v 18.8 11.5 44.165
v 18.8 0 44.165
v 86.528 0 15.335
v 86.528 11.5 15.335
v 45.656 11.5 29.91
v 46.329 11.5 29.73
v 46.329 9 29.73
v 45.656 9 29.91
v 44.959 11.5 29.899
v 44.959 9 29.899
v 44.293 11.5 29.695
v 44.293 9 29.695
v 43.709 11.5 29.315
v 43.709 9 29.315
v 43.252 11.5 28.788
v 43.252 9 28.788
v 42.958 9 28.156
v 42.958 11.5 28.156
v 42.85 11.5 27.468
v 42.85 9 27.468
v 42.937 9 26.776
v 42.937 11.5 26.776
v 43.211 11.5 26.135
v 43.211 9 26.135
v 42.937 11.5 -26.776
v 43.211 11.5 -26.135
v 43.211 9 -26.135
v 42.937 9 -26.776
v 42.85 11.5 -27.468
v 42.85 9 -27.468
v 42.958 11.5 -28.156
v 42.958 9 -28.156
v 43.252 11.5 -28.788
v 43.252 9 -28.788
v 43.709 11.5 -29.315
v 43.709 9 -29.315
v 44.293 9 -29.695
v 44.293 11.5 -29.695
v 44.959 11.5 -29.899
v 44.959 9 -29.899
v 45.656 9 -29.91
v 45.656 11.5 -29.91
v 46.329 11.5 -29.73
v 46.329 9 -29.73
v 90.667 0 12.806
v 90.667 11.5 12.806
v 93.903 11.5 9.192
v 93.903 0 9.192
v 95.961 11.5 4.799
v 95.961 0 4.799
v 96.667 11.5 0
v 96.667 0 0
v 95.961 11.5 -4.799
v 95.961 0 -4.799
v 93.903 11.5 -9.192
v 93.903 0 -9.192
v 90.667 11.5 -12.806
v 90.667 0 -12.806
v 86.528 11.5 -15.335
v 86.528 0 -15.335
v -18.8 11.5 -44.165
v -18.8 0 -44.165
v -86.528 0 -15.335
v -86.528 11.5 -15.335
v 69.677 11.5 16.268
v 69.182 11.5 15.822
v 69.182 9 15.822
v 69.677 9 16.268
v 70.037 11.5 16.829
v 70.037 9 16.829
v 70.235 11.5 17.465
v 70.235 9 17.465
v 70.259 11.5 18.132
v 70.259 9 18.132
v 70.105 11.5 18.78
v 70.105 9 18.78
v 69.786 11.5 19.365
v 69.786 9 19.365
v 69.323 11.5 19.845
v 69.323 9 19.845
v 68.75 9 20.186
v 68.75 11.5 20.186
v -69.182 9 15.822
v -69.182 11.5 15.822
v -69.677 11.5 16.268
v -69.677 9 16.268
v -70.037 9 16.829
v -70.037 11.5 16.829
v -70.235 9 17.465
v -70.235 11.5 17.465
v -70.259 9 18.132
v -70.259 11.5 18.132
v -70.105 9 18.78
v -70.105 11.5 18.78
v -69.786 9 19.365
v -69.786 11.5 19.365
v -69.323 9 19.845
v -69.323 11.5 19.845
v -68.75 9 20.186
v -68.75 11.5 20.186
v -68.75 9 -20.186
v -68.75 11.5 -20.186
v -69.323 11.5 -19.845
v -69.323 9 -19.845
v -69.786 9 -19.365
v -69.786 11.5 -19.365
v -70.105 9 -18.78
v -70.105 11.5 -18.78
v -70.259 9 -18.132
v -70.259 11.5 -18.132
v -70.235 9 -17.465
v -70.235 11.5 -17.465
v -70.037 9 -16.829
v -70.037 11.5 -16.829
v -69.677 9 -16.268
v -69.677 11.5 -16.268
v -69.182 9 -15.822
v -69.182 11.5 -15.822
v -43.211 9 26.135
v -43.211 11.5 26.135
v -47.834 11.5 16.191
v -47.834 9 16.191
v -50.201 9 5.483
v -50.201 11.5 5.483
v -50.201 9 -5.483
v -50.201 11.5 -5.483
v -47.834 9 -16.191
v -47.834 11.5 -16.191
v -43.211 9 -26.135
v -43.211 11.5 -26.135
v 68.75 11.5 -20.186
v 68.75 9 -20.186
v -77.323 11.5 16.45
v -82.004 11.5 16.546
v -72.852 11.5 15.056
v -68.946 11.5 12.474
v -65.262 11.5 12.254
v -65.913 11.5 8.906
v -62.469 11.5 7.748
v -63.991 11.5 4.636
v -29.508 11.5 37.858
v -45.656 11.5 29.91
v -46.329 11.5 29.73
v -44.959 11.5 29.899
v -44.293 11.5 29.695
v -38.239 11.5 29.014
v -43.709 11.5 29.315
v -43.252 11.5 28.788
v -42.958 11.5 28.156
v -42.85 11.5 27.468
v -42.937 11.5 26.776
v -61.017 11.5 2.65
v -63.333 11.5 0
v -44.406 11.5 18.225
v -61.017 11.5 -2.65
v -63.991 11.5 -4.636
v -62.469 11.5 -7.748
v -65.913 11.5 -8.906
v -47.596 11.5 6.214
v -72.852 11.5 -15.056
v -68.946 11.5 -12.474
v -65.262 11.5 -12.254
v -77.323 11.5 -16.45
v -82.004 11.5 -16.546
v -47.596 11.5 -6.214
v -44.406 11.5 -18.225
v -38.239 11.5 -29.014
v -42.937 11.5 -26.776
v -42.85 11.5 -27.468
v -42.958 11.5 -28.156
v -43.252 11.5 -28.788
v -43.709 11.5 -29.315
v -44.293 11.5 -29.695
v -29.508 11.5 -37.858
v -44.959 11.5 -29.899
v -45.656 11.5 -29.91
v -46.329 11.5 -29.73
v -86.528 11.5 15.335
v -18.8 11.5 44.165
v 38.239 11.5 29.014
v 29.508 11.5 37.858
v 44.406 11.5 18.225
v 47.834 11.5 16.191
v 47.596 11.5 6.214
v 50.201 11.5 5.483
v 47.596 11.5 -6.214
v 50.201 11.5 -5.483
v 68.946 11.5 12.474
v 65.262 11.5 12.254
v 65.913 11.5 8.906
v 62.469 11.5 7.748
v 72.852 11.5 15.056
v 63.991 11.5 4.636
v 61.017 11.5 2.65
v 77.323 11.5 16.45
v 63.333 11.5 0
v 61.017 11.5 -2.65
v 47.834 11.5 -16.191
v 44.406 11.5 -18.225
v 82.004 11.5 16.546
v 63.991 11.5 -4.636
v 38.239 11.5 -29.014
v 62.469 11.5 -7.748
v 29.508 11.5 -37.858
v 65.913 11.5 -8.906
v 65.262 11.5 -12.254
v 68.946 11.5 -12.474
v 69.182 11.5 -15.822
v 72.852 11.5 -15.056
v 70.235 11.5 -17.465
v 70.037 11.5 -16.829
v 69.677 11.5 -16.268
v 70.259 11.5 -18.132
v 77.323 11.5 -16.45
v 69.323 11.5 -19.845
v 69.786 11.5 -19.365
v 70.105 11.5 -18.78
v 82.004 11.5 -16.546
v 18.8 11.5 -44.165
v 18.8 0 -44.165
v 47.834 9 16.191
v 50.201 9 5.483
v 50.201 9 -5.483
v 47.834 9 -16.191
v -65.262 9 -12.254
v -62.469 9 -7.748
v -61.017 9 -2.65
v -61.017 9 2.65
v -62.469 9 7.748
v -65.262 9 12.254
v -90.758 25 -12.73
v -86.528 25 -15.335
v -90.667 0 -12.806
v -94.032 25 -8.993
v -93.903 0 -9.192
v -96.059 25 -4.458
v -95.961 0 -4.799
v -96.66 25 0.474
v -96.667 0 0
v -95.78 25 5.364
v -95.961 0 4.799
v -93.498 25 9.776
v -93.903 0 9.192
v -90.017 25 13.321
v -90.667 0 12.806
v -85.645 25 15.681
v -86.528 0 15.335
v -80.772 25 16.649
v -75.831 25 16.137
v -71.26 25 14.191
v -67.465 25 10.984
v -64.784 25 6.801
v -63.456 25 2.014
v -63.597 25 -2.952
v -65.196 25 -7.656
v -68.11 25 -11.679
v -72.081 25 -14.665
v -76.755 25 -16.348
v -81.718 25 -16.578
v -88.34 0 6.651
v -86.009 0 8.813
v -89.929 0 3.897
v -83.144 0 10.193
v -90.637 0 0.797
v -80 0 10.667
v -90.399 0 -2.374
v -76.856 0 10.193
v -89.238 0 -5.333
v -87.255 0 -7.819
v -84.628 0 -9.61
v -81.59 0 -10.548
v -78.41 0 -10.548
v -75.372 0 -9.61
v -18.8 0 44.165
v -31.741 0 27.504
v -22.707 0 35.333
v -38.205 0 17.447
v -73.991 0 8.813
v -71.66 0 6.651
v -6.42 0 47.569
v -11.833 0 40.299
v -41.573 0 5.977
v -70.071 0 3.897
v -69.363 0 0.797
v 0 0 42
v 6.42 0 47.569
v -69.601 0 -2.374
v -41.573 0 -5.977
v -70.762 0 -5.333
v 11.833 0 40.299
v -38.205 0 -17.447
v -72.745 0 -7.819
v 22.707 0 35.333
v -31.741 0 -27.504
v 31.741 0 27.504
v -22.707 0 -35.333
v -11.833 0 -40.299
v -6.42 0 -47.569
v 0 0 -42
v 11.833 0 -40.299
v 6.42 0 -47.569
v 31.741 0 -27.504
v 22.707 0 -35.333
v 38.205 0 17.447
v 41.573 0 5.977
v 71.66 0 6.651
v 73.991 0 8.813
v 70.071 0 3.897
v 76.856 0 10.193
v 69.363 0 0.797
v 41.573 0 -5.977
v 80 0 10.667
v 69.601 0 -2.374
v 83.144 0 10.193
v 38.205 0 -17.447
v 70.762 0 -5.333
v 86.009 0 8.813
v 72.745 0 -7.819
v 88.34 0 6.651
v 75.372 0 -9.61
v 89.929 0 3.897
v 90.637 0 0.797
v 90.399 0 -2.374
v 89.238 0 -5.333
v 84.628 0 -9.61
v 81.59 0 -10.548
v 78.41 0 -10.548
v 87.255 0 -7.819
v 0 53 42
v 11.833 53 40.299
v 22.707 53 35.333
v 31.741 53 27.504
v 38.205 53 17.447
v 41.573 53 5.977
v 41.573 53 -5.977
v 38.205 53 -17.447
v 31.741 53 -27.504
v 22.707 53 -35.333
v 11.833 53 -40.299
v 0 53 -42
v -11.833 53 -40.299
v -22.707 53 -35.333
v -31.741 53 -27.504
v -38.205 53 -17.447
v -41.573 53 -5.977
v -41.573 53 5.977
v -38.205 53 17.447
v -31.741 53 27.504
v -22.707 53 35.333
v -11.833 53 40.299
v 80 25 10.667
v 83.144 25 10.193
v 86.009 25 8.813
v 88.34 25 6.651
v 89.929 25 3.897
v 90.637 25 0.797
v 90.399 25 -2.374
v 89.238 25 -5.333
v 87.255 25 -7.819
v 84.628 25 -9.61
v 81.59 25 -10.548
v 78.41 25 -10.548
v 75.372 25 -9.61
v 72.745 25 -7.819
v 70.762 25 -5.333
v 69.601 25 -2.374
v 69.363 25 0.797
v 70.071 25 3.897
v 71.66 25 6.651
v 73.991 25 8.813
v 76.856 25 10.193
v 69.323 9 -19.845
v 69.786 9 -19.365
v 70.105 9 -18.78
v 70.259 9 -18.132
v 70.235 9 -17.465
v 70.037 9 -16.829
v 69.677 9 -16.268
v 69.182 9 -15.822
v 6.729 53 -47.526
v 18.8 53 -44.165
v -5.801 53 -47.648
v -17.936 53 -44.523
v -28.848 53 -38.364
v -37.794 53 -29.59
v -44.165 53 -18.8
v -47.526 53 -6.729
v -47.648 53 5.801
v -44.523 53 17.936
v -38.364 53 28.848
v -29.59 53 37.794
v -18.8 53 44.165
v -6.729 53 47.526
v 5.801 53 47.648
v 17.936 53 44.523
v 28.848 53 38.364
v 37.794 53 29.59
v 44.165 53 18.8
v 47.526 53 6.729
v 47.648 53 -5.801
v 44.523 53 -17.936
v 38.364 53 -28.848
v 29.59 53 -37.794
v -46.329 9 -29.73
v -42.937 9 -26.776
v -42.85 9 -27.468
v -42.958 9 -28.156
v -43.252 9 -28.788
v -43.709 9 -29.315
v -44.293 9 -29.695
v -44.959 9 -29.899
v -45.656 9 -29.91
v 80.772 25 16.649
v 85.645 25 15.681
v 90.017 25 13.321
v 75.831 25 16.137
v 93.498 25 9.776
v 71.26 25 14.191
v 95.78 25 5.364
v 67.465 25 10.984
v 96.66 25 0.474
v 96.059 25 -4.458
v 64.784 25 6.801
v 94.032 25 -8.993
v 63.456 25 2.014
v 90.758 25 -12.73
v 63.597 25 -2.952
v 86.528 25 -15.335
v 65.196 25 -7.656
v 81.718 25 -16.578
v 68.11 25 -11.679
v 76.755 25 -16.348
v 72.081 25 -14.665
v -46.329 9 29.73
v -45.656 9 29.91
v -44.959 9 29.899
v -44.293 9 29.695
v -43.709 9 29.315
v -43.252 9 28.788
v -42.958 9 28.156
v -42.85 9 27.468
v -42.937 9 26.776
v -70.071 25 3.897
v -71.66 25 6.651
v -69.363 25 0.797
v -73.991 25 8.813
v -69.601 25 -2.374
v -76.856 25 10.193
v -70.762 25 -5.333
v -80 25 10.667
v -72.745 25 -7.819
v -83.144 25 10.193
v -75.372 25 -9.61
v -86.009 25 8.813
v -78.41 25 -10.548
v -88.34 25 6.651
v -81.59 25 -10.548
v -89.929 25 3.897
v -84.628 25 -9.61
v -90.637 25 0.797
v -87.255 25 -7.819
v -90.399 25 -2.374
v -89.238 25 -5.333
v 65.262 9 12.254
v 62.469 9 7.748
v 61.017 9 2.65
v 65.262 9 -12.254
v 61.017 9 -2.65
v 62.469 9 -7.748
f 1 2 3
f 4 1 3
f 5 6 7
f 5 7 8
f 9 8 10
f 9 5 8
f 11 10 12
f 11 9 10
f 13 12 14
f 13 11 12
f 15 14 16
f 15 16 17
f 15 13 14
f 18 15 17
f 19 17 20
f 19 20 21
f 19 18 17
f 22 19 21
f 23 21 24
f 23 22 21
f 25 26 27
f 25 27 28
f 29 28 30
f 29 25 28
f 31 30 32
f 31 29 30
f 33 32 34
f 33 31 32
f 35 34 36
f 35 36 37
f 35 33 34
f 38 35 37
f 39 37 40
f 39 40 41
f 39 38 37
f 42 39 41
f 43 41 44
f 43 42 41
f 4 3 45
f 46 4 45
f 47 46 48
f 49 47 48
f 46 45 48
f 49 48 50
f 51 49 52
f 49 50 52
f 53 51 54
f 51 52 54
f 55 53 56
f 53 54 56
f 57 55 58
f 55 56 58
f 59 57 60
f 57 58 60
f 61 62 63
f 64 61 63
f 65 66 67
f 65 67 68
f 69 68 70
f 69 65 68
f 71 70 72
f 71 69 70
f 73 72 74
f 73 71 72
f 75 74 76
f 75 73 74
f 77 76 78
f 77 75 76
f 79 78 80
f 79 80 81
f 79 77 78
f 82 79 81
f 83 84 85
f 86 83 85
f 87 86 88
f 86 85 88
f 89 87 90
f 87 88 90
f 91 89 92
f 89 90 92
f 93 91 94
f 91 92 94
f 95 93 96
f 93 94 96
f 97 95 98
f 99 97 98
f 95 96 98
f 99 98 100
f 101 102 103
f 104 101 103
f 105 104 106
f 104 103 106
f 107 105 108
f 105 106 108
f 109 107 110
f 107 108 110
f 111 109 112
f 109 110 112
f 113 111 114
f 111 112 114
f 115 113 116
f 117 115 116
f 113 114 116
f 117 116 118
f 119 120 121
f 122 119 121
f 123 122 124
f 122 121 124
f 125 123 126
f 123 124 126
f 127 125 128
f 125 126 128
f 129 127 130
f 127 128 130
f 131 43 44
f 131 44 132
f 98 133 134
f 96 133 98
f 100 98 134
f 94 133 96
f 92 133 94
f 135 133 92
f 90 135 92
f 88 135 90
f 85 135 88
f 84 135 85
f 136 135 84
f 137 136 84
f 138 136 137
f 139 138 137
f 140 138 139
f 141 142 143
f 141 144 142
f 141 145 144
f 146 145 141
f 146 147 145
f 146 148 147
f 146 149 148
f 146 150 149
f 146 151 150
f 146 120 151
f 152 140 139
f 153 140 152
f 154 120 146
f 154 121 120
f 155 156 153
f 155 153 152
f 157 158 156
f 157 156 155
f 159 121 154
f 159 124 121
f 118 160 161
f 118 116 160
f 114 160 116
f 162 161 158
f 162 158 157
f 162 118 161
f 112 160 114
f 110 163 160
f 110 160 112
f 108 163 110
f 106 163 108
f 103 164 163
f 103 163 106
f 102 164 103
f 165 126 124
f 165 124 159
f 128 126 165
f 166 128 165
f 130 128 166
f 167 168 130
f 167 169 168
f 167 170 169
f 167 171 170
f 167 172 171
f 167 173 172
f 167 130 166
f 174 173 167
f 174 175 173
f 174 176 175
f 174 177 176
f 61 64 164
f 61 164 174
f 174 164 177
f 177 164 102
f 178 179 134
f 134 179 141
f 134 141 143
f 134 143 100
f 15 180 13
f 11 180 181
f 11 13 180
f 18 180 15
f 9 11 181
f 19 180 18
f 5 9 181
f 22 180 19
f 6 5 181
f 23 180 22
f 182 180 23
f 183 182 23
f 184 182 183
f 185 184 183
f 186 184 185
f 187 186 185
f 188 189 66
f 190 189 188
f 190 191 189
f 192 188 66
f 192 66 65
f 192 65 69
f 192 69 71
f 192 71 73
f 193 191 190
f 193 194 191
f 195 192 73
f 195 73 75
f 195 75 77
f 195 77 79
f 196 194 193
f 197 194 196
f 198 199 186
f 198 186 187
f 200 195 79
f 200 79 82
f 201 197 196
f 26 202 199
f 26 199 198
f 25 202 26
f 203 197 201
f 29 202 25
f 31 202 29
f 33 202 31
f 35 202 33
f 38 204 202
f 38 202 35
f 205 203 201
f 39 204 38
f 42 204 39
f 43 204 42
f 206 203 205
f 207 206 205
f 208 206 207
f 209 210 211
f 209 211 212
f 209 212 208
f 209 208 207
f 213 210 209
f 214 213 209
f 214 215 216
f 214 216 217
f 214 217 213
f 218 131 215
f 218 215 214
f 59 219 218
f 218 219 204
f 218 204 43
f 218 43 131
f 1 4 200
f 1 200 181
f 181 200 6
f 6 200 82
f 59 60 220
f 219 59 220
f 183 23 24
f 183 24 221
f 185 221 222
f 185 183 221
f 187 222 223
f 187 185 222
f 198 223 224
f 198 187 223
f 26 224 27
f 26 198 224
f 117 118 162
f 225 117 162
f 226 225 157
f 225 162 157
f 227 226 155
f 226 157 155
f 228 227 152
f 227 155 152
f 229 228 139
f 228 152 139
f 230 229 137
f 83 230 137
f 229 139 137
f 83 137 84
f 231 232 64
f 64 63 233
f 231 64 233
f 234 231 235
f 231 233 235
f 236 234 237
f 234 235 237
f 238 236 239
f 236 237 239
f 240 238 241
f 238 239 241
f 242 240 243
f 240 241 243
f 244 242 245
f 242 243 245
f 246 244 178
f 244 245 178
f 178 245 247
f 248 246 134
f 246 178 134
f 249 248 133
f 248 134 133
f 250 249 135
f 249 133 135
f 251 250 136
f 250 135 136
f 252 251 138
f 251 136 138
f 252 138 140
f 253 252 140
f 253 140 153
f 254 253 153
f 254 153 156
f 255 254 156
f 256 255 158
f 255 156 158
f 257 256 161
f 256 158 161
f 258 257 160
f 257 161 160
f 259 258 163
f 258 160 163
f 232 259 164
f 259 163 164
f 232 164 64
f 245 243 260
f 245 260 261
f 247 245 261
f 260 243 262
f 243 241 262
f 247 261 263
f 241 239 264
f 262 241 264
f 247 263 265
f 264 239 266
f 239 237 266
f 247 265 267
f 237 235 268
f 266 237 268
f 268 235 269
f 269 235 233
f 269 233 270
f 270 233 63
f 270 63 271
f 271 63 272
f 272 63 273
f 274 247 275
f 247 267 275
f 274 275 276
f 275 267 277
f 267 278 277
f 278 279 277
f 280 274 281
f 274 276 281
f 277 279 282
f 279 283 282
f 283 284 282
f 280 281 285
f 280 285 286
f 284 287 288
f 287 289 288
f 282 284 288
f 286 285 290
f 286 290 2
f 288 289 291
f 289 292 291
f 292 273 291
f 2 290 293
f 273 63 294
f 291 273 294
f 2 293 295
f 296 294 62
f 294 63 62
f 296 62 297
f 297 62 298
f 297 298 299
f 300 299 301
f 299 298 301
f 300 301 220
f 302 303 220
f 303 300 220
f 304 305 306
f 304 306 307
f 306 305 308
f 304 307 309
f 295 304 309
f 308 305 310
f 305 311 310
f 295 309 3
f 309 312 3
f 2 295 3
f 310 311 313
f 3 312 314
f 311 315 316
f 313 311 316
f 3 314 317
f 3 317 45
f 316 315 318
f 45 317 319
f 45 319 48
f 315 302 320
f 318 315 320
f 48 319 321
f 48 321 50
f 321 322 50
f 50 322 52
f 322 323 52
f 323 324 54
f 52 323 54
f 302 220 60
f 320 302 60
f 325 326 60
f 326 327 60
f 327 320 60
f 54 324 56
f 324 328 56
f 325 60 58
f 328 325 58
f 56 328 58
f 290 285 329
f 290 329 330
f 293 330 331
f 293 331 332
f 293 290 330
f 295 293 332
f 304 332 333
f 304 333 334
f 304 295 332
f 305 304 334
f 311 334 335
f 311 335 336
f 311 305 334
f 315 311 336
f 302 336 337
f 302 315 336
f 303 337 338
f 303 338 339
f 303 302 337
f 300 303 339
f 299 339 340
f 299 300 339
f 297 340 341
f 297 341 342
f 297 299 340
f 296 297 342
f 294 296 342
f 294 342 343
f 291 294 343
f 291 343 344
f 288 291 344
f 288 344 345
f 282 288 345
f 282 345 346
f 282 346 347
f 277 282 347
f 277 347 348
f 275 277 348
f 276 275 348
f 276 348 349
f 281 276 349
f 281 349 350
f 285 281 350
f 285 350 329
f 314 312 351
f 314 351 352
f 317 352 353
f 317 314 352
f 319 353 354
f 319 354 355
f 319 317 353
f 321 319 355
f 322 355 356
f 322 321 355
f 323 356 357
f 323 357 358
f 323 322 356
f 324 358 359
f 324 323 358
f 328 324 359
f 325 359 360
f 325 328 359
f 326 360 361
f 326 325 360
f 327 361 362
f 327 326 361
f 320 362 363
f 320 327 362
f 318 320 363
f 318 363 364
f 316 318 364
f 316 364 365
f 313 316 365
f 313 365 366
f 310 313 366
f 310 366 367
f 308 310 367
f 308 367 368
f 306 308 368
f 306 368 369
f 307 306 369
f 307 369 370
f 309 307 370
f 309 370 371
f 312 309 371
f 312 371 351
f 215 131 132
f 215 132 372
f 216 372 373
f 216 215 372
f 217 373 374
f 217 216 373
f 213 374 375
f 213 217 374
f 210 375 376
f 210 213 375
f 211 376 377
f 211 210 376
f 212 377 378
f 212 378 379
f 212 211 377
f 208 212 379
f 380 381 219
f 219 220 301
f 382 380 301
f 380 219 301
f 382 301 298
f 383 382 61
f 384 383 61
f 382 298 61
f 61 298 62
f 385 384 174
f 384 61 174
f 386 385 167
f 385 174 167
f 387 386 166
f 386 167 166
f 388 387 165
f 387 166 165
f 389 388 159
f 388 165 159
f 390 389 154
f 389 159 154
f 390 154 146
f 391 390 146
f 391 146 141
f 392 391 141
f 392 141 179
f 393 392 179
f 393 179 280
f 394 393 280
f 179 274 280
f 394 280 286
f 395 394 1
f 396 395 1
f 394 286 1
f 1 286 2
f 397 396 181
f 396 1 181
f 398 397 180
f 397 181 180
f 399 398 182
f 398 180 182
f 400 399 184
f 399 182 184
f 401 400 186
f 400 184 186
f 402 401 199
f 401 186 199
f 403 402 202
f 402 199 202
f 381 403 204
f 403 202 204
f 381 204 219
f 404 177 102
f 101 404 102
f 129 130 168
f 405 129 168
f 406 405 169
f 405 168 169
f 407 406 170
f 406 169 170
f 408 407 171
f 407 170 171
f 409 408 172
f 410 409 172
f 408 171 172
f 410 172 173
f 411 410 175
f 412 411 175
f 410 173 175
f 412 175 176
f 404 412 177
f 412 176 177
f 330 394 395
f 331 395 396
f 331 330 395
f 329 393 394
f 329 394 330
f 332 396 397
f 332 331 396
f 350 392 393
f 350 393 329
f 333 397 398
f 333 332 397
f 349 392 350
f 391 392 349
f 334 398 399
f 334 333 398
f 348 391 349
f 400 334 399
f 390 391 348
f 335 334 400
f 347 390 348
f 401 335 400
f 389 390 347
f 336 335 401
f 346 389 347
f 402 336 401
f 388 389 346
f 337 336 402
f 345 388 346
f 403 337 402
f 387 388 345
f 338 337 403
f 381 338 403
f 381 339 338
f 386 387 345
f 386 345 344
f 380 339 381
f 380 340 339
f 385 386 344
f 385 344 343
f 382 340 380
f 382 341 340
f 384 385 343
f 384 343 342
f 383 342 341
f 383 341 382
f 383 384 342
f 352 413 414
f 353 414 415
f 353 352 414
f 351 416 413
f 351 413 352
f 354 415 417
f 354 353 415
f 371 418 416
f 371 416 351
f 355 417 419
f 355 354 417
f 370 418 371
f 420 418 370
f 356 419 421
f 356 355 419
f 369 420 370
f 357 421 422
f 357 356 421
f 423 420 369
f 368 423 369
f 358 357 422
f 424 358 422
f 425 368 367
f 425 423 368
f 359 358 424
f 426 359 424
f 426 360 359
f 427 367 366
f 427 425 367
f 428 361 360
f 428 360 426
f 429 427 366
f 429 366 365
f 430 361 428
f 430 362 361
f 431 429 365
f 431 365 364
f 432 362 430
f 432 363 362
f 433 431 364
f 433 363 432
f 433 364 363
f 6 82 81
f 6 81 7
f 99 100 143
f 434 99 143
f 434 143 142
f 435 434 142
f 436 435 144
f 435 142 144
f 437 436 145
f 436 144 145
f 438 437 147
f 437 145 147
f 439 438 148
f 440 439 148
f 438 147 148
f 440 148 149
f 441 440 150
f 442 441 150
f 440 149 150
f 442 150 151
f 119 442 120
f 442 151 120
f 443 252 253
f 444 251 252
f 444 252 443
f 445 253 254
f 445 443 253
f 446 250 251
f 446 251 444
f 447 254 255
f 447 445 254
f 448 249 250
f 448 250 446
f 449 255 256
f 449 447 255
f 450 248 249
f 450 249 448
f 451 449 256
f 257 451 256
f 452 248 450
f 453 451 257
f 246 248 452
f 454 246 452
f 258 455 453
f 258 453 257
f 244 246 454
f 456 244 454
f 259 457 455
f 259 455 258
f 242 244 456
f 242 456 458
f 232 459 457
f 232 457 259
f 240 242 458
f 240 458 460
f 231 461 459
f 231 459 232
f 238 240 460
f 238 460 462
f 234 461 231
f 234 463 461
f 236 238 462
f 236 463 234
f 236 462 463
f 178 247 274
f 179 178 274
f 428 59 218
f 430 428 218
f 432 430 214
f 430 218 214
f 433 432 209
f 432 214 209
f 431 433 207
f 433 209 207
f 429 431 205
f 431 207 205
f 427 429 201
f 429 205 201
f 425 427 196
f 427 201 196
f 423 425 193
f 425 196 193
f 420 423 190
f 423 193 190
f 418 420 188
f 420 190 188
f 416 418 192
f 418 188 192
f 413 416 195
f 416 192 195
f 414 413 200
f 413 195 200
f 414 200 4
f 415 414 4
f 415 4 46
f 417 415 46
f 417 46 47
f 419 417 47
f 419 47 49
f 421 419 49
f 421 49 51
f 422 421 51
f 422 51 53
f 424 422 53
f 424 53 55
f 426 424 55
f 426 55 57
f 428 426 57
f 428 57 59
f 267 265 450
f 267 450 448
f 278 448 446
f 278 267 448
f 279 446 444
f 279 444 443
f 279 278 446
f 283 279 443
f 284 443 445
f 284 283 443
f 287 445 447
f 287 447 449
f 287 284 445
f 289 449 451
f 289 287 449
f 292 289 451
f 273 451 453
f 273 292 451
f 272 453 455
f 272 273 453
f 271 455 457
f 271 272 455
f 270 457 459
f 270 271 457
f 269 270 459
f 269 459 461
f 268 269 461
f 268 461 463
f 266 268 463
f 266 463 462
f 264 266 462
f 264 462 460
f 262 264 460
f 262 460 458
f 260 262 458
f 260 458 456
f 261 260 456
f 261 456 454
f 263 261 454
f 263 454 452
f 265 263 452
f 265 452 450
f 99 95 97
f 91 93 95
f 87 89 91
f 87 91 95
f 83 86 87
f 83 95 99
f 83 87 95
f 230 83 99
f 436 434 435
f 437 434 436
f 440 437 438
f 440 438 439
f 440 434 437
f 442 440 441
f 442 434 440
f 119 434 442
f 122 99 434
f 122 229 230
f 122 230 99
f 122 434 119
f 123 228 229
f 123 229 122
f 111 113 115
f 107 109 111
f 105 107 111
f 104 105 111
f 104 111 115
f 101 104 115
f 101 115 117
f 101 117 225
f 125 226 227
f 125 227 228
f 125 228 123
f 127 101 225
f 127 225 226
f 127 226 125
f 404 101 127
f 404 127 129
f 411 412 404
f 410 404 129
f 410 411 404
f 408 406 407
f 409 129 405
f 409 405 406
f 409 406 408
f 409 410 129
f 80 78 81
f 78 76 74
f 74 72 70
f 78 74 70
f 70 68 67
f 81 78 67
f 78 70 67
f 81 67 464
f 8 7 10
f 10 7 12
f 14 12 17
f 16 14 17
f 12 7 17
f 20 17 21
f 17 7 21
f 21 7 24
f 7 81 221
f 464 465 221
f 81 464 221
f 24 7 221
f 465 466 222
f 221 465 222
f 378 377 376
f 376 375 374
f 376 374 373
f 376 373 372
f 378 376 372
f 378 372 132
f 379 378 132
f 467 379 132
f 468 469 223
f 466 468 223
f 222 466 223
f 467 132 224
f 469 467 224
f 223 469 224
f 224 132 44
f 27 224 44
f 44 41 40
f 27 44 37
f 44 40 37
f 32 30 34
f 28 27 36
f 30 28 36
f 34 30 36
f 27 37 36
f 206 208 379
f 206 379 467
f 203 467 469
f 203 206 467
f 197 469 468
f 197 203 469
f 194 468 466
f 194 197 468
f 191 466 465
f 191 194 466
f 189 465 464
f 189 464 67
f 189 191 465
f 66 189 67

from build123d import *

# Parameters (mm, degrees)
SKETCH1_R           = 42
SKETCH1_R_2         = 10.666666667
BOSS_EXTRUDE1_DEPTH = 11.5
SKETCH1_3_R         = 16.666666667
SKETCH1_3_R_2       = 10.666666667
BOSS_EXTRUDE2_DEPTH = 25
SKETCH1_4_R         = 42
BOSS_EXTRUDE3_DEPTH = 53
CUT_EXTRUDE1_DEPTH  = 2.5


with BuildPart() as part:
    # Sketch1 → Boss-Extrude1 (new body)
    with BuildSketch(Plane(origin=(0, 0, 0), x_dir=(1, 0, 0), z_dir=(0, 1, 0))):
        with BuildLine():
            Line((-18.8, 44.165144628), (-86.527777778, 15.335119662))
            ThreePointArc((-86.527777778, 15.335119662), (-96.666666667, 0), (-86.527777778, -15.335119662))
            Line((-86.527777778, -15.335119662), (-18.8, -44.165144628))
            ThreePointArc((-18.8, -44.165144628), (0, -48), (18.8, -44.165144628))
            Line((18.8, -44.165144628), (86.527777778, -15.335119662))
            ThreePointArc((86.527777778, -15.335119662), (96.666666667, 0), (86.527777778, 15.335119662))
            Line((86.527777778, 15.335119662), (18.8, 44.165144628))
            ThreePointArc((18.8, 44.165144628), (0, 48), (-18.8, 44.165144628))
        make_face()
        Circle(SKETCH1_R, mode=Mode.SUBTRACT)
        with Locations((-80, 0)):
            Circle(SKETCH1_R_2, mode=Mode.SUBTRACT)
        with Locations((80, 0)):
            Circle(SKETCH1_R_2, mode=Mode.SUBTRACT)
    extrude(amount=BOSS_EXTRUDE1_DEPTH)

    # Sketch1<3> → Boss-Extrude2 (add)
    # profile 1 of 2: a face of its own
    with BuildSketch(Plane(origin=(0, 0, 0), x_dir=(1, 0, 0), z_dir=(0, 1, 0))):
        with Locations((-80, 0)):
            Circle(SKETCH1_3_R)
        with Locations((-80, 0)):
            Circle(SKETCH1_3_R_2, mode=Mode.SUBTRACT)
    # profile 2 of 2: a face of its own
    with BuildSketch(Plane(origin=(0, 0, 0), x_dir=(1, 0, 0), z_dir=(0, 1, 0))):
        with Locations((80, 0)):
            Circle(SKETCH1_3_R)
        with Locations((80, 0)):
            Circle(SKETCH1_3_R_2, mode=Mode.SUBTRACT)
    extrude(amount=BOSS_EXTRUDE2_DEPTH)

    # Sketch1<4> → Boss-Extrude3 (add)
    with BuildSketch(Plane(origin=(0, 0, 0), x_dir=(1, 0, 0), z_dir=(0, 1, 0))):
        with BuildLine():
            ThreePointArc((18.8, 44.165144628), (0, 48), (-18.8, 44.165144628))
            ThreePointArc((-18.8, 44.165144628), (-48, 0), (-18.8, -44.165144628))
            ThreePointArc((-18.8, -44.165144628), (0, -48), (18.8, -44.165144628))
            ThreePointArc((18.8, -44.165144628), (40.03998002, -26.472627372), (48, 0))
            ThreePointArc((48, 0), (40.03998002, 26.472627372), (18.8, 44.165144628))
        make_face()
        Circle(SKETCH1_4_R, mode=Mode.SUBTRACT)
    extrude(amount=BOSS_EXTRUDE3_DEPTH)

    # Sketch2 → Cut-Extrude1 (cut)
    with BuildSketch(Plane(origin=(0, 11.5, 0), x_dir=(1, 0, 0), z_dir=(0, 1, 0))):
        with BuildLine():
            Line((-68.749829189, -20.185673992), (-46.329311604, -29.72952886))
            ThreePointArc((-46.329311604, -29.72952886), (-43.461816215, -29.067618209), (-43.210987158, -26.135427849))
            ThreePointArc((-43.210987158, -26.135427849), (-50.5, 0), (-43.210987158, 26.135427849))
            ThreePointArc((-43.210987158, 26.135427849), (-43.461816215, 29.067618209), (-46.329311604, 29.72952886))
            Line((-46.329311604, 29.72952886), (-68.749829189, 20.185673992))
            ThreePointArc((-68.749829189, 20.185673992), (-70.258507425, 18.131633045), (-69.181739923, 15.821705345))
            ThreePointArc((-69.181739923, 15.821705345), (-60.833333333, 0), (-69.181739923, -15.821705345))
            ThreePointArc((-69.181739923, -15.821705345), (-70.258507425, -18.131633045), (-68.749829189, -20.185673992))
        make_face()
    cut_extrude1 = extrude(amount=-CUT_EXTRUDE1_DEPTH, mode=Mode.SUBTRACT)

    # Mirror1: Cut-Extrude1 across plane
    add(cut_extrude1.mirror(Plane(origin=(0, 0, 0), x_dir=(0, 0, 1), z_dir=(1, 0, 0))), mode=Mode.SUBTRACT)


solid = part.part
